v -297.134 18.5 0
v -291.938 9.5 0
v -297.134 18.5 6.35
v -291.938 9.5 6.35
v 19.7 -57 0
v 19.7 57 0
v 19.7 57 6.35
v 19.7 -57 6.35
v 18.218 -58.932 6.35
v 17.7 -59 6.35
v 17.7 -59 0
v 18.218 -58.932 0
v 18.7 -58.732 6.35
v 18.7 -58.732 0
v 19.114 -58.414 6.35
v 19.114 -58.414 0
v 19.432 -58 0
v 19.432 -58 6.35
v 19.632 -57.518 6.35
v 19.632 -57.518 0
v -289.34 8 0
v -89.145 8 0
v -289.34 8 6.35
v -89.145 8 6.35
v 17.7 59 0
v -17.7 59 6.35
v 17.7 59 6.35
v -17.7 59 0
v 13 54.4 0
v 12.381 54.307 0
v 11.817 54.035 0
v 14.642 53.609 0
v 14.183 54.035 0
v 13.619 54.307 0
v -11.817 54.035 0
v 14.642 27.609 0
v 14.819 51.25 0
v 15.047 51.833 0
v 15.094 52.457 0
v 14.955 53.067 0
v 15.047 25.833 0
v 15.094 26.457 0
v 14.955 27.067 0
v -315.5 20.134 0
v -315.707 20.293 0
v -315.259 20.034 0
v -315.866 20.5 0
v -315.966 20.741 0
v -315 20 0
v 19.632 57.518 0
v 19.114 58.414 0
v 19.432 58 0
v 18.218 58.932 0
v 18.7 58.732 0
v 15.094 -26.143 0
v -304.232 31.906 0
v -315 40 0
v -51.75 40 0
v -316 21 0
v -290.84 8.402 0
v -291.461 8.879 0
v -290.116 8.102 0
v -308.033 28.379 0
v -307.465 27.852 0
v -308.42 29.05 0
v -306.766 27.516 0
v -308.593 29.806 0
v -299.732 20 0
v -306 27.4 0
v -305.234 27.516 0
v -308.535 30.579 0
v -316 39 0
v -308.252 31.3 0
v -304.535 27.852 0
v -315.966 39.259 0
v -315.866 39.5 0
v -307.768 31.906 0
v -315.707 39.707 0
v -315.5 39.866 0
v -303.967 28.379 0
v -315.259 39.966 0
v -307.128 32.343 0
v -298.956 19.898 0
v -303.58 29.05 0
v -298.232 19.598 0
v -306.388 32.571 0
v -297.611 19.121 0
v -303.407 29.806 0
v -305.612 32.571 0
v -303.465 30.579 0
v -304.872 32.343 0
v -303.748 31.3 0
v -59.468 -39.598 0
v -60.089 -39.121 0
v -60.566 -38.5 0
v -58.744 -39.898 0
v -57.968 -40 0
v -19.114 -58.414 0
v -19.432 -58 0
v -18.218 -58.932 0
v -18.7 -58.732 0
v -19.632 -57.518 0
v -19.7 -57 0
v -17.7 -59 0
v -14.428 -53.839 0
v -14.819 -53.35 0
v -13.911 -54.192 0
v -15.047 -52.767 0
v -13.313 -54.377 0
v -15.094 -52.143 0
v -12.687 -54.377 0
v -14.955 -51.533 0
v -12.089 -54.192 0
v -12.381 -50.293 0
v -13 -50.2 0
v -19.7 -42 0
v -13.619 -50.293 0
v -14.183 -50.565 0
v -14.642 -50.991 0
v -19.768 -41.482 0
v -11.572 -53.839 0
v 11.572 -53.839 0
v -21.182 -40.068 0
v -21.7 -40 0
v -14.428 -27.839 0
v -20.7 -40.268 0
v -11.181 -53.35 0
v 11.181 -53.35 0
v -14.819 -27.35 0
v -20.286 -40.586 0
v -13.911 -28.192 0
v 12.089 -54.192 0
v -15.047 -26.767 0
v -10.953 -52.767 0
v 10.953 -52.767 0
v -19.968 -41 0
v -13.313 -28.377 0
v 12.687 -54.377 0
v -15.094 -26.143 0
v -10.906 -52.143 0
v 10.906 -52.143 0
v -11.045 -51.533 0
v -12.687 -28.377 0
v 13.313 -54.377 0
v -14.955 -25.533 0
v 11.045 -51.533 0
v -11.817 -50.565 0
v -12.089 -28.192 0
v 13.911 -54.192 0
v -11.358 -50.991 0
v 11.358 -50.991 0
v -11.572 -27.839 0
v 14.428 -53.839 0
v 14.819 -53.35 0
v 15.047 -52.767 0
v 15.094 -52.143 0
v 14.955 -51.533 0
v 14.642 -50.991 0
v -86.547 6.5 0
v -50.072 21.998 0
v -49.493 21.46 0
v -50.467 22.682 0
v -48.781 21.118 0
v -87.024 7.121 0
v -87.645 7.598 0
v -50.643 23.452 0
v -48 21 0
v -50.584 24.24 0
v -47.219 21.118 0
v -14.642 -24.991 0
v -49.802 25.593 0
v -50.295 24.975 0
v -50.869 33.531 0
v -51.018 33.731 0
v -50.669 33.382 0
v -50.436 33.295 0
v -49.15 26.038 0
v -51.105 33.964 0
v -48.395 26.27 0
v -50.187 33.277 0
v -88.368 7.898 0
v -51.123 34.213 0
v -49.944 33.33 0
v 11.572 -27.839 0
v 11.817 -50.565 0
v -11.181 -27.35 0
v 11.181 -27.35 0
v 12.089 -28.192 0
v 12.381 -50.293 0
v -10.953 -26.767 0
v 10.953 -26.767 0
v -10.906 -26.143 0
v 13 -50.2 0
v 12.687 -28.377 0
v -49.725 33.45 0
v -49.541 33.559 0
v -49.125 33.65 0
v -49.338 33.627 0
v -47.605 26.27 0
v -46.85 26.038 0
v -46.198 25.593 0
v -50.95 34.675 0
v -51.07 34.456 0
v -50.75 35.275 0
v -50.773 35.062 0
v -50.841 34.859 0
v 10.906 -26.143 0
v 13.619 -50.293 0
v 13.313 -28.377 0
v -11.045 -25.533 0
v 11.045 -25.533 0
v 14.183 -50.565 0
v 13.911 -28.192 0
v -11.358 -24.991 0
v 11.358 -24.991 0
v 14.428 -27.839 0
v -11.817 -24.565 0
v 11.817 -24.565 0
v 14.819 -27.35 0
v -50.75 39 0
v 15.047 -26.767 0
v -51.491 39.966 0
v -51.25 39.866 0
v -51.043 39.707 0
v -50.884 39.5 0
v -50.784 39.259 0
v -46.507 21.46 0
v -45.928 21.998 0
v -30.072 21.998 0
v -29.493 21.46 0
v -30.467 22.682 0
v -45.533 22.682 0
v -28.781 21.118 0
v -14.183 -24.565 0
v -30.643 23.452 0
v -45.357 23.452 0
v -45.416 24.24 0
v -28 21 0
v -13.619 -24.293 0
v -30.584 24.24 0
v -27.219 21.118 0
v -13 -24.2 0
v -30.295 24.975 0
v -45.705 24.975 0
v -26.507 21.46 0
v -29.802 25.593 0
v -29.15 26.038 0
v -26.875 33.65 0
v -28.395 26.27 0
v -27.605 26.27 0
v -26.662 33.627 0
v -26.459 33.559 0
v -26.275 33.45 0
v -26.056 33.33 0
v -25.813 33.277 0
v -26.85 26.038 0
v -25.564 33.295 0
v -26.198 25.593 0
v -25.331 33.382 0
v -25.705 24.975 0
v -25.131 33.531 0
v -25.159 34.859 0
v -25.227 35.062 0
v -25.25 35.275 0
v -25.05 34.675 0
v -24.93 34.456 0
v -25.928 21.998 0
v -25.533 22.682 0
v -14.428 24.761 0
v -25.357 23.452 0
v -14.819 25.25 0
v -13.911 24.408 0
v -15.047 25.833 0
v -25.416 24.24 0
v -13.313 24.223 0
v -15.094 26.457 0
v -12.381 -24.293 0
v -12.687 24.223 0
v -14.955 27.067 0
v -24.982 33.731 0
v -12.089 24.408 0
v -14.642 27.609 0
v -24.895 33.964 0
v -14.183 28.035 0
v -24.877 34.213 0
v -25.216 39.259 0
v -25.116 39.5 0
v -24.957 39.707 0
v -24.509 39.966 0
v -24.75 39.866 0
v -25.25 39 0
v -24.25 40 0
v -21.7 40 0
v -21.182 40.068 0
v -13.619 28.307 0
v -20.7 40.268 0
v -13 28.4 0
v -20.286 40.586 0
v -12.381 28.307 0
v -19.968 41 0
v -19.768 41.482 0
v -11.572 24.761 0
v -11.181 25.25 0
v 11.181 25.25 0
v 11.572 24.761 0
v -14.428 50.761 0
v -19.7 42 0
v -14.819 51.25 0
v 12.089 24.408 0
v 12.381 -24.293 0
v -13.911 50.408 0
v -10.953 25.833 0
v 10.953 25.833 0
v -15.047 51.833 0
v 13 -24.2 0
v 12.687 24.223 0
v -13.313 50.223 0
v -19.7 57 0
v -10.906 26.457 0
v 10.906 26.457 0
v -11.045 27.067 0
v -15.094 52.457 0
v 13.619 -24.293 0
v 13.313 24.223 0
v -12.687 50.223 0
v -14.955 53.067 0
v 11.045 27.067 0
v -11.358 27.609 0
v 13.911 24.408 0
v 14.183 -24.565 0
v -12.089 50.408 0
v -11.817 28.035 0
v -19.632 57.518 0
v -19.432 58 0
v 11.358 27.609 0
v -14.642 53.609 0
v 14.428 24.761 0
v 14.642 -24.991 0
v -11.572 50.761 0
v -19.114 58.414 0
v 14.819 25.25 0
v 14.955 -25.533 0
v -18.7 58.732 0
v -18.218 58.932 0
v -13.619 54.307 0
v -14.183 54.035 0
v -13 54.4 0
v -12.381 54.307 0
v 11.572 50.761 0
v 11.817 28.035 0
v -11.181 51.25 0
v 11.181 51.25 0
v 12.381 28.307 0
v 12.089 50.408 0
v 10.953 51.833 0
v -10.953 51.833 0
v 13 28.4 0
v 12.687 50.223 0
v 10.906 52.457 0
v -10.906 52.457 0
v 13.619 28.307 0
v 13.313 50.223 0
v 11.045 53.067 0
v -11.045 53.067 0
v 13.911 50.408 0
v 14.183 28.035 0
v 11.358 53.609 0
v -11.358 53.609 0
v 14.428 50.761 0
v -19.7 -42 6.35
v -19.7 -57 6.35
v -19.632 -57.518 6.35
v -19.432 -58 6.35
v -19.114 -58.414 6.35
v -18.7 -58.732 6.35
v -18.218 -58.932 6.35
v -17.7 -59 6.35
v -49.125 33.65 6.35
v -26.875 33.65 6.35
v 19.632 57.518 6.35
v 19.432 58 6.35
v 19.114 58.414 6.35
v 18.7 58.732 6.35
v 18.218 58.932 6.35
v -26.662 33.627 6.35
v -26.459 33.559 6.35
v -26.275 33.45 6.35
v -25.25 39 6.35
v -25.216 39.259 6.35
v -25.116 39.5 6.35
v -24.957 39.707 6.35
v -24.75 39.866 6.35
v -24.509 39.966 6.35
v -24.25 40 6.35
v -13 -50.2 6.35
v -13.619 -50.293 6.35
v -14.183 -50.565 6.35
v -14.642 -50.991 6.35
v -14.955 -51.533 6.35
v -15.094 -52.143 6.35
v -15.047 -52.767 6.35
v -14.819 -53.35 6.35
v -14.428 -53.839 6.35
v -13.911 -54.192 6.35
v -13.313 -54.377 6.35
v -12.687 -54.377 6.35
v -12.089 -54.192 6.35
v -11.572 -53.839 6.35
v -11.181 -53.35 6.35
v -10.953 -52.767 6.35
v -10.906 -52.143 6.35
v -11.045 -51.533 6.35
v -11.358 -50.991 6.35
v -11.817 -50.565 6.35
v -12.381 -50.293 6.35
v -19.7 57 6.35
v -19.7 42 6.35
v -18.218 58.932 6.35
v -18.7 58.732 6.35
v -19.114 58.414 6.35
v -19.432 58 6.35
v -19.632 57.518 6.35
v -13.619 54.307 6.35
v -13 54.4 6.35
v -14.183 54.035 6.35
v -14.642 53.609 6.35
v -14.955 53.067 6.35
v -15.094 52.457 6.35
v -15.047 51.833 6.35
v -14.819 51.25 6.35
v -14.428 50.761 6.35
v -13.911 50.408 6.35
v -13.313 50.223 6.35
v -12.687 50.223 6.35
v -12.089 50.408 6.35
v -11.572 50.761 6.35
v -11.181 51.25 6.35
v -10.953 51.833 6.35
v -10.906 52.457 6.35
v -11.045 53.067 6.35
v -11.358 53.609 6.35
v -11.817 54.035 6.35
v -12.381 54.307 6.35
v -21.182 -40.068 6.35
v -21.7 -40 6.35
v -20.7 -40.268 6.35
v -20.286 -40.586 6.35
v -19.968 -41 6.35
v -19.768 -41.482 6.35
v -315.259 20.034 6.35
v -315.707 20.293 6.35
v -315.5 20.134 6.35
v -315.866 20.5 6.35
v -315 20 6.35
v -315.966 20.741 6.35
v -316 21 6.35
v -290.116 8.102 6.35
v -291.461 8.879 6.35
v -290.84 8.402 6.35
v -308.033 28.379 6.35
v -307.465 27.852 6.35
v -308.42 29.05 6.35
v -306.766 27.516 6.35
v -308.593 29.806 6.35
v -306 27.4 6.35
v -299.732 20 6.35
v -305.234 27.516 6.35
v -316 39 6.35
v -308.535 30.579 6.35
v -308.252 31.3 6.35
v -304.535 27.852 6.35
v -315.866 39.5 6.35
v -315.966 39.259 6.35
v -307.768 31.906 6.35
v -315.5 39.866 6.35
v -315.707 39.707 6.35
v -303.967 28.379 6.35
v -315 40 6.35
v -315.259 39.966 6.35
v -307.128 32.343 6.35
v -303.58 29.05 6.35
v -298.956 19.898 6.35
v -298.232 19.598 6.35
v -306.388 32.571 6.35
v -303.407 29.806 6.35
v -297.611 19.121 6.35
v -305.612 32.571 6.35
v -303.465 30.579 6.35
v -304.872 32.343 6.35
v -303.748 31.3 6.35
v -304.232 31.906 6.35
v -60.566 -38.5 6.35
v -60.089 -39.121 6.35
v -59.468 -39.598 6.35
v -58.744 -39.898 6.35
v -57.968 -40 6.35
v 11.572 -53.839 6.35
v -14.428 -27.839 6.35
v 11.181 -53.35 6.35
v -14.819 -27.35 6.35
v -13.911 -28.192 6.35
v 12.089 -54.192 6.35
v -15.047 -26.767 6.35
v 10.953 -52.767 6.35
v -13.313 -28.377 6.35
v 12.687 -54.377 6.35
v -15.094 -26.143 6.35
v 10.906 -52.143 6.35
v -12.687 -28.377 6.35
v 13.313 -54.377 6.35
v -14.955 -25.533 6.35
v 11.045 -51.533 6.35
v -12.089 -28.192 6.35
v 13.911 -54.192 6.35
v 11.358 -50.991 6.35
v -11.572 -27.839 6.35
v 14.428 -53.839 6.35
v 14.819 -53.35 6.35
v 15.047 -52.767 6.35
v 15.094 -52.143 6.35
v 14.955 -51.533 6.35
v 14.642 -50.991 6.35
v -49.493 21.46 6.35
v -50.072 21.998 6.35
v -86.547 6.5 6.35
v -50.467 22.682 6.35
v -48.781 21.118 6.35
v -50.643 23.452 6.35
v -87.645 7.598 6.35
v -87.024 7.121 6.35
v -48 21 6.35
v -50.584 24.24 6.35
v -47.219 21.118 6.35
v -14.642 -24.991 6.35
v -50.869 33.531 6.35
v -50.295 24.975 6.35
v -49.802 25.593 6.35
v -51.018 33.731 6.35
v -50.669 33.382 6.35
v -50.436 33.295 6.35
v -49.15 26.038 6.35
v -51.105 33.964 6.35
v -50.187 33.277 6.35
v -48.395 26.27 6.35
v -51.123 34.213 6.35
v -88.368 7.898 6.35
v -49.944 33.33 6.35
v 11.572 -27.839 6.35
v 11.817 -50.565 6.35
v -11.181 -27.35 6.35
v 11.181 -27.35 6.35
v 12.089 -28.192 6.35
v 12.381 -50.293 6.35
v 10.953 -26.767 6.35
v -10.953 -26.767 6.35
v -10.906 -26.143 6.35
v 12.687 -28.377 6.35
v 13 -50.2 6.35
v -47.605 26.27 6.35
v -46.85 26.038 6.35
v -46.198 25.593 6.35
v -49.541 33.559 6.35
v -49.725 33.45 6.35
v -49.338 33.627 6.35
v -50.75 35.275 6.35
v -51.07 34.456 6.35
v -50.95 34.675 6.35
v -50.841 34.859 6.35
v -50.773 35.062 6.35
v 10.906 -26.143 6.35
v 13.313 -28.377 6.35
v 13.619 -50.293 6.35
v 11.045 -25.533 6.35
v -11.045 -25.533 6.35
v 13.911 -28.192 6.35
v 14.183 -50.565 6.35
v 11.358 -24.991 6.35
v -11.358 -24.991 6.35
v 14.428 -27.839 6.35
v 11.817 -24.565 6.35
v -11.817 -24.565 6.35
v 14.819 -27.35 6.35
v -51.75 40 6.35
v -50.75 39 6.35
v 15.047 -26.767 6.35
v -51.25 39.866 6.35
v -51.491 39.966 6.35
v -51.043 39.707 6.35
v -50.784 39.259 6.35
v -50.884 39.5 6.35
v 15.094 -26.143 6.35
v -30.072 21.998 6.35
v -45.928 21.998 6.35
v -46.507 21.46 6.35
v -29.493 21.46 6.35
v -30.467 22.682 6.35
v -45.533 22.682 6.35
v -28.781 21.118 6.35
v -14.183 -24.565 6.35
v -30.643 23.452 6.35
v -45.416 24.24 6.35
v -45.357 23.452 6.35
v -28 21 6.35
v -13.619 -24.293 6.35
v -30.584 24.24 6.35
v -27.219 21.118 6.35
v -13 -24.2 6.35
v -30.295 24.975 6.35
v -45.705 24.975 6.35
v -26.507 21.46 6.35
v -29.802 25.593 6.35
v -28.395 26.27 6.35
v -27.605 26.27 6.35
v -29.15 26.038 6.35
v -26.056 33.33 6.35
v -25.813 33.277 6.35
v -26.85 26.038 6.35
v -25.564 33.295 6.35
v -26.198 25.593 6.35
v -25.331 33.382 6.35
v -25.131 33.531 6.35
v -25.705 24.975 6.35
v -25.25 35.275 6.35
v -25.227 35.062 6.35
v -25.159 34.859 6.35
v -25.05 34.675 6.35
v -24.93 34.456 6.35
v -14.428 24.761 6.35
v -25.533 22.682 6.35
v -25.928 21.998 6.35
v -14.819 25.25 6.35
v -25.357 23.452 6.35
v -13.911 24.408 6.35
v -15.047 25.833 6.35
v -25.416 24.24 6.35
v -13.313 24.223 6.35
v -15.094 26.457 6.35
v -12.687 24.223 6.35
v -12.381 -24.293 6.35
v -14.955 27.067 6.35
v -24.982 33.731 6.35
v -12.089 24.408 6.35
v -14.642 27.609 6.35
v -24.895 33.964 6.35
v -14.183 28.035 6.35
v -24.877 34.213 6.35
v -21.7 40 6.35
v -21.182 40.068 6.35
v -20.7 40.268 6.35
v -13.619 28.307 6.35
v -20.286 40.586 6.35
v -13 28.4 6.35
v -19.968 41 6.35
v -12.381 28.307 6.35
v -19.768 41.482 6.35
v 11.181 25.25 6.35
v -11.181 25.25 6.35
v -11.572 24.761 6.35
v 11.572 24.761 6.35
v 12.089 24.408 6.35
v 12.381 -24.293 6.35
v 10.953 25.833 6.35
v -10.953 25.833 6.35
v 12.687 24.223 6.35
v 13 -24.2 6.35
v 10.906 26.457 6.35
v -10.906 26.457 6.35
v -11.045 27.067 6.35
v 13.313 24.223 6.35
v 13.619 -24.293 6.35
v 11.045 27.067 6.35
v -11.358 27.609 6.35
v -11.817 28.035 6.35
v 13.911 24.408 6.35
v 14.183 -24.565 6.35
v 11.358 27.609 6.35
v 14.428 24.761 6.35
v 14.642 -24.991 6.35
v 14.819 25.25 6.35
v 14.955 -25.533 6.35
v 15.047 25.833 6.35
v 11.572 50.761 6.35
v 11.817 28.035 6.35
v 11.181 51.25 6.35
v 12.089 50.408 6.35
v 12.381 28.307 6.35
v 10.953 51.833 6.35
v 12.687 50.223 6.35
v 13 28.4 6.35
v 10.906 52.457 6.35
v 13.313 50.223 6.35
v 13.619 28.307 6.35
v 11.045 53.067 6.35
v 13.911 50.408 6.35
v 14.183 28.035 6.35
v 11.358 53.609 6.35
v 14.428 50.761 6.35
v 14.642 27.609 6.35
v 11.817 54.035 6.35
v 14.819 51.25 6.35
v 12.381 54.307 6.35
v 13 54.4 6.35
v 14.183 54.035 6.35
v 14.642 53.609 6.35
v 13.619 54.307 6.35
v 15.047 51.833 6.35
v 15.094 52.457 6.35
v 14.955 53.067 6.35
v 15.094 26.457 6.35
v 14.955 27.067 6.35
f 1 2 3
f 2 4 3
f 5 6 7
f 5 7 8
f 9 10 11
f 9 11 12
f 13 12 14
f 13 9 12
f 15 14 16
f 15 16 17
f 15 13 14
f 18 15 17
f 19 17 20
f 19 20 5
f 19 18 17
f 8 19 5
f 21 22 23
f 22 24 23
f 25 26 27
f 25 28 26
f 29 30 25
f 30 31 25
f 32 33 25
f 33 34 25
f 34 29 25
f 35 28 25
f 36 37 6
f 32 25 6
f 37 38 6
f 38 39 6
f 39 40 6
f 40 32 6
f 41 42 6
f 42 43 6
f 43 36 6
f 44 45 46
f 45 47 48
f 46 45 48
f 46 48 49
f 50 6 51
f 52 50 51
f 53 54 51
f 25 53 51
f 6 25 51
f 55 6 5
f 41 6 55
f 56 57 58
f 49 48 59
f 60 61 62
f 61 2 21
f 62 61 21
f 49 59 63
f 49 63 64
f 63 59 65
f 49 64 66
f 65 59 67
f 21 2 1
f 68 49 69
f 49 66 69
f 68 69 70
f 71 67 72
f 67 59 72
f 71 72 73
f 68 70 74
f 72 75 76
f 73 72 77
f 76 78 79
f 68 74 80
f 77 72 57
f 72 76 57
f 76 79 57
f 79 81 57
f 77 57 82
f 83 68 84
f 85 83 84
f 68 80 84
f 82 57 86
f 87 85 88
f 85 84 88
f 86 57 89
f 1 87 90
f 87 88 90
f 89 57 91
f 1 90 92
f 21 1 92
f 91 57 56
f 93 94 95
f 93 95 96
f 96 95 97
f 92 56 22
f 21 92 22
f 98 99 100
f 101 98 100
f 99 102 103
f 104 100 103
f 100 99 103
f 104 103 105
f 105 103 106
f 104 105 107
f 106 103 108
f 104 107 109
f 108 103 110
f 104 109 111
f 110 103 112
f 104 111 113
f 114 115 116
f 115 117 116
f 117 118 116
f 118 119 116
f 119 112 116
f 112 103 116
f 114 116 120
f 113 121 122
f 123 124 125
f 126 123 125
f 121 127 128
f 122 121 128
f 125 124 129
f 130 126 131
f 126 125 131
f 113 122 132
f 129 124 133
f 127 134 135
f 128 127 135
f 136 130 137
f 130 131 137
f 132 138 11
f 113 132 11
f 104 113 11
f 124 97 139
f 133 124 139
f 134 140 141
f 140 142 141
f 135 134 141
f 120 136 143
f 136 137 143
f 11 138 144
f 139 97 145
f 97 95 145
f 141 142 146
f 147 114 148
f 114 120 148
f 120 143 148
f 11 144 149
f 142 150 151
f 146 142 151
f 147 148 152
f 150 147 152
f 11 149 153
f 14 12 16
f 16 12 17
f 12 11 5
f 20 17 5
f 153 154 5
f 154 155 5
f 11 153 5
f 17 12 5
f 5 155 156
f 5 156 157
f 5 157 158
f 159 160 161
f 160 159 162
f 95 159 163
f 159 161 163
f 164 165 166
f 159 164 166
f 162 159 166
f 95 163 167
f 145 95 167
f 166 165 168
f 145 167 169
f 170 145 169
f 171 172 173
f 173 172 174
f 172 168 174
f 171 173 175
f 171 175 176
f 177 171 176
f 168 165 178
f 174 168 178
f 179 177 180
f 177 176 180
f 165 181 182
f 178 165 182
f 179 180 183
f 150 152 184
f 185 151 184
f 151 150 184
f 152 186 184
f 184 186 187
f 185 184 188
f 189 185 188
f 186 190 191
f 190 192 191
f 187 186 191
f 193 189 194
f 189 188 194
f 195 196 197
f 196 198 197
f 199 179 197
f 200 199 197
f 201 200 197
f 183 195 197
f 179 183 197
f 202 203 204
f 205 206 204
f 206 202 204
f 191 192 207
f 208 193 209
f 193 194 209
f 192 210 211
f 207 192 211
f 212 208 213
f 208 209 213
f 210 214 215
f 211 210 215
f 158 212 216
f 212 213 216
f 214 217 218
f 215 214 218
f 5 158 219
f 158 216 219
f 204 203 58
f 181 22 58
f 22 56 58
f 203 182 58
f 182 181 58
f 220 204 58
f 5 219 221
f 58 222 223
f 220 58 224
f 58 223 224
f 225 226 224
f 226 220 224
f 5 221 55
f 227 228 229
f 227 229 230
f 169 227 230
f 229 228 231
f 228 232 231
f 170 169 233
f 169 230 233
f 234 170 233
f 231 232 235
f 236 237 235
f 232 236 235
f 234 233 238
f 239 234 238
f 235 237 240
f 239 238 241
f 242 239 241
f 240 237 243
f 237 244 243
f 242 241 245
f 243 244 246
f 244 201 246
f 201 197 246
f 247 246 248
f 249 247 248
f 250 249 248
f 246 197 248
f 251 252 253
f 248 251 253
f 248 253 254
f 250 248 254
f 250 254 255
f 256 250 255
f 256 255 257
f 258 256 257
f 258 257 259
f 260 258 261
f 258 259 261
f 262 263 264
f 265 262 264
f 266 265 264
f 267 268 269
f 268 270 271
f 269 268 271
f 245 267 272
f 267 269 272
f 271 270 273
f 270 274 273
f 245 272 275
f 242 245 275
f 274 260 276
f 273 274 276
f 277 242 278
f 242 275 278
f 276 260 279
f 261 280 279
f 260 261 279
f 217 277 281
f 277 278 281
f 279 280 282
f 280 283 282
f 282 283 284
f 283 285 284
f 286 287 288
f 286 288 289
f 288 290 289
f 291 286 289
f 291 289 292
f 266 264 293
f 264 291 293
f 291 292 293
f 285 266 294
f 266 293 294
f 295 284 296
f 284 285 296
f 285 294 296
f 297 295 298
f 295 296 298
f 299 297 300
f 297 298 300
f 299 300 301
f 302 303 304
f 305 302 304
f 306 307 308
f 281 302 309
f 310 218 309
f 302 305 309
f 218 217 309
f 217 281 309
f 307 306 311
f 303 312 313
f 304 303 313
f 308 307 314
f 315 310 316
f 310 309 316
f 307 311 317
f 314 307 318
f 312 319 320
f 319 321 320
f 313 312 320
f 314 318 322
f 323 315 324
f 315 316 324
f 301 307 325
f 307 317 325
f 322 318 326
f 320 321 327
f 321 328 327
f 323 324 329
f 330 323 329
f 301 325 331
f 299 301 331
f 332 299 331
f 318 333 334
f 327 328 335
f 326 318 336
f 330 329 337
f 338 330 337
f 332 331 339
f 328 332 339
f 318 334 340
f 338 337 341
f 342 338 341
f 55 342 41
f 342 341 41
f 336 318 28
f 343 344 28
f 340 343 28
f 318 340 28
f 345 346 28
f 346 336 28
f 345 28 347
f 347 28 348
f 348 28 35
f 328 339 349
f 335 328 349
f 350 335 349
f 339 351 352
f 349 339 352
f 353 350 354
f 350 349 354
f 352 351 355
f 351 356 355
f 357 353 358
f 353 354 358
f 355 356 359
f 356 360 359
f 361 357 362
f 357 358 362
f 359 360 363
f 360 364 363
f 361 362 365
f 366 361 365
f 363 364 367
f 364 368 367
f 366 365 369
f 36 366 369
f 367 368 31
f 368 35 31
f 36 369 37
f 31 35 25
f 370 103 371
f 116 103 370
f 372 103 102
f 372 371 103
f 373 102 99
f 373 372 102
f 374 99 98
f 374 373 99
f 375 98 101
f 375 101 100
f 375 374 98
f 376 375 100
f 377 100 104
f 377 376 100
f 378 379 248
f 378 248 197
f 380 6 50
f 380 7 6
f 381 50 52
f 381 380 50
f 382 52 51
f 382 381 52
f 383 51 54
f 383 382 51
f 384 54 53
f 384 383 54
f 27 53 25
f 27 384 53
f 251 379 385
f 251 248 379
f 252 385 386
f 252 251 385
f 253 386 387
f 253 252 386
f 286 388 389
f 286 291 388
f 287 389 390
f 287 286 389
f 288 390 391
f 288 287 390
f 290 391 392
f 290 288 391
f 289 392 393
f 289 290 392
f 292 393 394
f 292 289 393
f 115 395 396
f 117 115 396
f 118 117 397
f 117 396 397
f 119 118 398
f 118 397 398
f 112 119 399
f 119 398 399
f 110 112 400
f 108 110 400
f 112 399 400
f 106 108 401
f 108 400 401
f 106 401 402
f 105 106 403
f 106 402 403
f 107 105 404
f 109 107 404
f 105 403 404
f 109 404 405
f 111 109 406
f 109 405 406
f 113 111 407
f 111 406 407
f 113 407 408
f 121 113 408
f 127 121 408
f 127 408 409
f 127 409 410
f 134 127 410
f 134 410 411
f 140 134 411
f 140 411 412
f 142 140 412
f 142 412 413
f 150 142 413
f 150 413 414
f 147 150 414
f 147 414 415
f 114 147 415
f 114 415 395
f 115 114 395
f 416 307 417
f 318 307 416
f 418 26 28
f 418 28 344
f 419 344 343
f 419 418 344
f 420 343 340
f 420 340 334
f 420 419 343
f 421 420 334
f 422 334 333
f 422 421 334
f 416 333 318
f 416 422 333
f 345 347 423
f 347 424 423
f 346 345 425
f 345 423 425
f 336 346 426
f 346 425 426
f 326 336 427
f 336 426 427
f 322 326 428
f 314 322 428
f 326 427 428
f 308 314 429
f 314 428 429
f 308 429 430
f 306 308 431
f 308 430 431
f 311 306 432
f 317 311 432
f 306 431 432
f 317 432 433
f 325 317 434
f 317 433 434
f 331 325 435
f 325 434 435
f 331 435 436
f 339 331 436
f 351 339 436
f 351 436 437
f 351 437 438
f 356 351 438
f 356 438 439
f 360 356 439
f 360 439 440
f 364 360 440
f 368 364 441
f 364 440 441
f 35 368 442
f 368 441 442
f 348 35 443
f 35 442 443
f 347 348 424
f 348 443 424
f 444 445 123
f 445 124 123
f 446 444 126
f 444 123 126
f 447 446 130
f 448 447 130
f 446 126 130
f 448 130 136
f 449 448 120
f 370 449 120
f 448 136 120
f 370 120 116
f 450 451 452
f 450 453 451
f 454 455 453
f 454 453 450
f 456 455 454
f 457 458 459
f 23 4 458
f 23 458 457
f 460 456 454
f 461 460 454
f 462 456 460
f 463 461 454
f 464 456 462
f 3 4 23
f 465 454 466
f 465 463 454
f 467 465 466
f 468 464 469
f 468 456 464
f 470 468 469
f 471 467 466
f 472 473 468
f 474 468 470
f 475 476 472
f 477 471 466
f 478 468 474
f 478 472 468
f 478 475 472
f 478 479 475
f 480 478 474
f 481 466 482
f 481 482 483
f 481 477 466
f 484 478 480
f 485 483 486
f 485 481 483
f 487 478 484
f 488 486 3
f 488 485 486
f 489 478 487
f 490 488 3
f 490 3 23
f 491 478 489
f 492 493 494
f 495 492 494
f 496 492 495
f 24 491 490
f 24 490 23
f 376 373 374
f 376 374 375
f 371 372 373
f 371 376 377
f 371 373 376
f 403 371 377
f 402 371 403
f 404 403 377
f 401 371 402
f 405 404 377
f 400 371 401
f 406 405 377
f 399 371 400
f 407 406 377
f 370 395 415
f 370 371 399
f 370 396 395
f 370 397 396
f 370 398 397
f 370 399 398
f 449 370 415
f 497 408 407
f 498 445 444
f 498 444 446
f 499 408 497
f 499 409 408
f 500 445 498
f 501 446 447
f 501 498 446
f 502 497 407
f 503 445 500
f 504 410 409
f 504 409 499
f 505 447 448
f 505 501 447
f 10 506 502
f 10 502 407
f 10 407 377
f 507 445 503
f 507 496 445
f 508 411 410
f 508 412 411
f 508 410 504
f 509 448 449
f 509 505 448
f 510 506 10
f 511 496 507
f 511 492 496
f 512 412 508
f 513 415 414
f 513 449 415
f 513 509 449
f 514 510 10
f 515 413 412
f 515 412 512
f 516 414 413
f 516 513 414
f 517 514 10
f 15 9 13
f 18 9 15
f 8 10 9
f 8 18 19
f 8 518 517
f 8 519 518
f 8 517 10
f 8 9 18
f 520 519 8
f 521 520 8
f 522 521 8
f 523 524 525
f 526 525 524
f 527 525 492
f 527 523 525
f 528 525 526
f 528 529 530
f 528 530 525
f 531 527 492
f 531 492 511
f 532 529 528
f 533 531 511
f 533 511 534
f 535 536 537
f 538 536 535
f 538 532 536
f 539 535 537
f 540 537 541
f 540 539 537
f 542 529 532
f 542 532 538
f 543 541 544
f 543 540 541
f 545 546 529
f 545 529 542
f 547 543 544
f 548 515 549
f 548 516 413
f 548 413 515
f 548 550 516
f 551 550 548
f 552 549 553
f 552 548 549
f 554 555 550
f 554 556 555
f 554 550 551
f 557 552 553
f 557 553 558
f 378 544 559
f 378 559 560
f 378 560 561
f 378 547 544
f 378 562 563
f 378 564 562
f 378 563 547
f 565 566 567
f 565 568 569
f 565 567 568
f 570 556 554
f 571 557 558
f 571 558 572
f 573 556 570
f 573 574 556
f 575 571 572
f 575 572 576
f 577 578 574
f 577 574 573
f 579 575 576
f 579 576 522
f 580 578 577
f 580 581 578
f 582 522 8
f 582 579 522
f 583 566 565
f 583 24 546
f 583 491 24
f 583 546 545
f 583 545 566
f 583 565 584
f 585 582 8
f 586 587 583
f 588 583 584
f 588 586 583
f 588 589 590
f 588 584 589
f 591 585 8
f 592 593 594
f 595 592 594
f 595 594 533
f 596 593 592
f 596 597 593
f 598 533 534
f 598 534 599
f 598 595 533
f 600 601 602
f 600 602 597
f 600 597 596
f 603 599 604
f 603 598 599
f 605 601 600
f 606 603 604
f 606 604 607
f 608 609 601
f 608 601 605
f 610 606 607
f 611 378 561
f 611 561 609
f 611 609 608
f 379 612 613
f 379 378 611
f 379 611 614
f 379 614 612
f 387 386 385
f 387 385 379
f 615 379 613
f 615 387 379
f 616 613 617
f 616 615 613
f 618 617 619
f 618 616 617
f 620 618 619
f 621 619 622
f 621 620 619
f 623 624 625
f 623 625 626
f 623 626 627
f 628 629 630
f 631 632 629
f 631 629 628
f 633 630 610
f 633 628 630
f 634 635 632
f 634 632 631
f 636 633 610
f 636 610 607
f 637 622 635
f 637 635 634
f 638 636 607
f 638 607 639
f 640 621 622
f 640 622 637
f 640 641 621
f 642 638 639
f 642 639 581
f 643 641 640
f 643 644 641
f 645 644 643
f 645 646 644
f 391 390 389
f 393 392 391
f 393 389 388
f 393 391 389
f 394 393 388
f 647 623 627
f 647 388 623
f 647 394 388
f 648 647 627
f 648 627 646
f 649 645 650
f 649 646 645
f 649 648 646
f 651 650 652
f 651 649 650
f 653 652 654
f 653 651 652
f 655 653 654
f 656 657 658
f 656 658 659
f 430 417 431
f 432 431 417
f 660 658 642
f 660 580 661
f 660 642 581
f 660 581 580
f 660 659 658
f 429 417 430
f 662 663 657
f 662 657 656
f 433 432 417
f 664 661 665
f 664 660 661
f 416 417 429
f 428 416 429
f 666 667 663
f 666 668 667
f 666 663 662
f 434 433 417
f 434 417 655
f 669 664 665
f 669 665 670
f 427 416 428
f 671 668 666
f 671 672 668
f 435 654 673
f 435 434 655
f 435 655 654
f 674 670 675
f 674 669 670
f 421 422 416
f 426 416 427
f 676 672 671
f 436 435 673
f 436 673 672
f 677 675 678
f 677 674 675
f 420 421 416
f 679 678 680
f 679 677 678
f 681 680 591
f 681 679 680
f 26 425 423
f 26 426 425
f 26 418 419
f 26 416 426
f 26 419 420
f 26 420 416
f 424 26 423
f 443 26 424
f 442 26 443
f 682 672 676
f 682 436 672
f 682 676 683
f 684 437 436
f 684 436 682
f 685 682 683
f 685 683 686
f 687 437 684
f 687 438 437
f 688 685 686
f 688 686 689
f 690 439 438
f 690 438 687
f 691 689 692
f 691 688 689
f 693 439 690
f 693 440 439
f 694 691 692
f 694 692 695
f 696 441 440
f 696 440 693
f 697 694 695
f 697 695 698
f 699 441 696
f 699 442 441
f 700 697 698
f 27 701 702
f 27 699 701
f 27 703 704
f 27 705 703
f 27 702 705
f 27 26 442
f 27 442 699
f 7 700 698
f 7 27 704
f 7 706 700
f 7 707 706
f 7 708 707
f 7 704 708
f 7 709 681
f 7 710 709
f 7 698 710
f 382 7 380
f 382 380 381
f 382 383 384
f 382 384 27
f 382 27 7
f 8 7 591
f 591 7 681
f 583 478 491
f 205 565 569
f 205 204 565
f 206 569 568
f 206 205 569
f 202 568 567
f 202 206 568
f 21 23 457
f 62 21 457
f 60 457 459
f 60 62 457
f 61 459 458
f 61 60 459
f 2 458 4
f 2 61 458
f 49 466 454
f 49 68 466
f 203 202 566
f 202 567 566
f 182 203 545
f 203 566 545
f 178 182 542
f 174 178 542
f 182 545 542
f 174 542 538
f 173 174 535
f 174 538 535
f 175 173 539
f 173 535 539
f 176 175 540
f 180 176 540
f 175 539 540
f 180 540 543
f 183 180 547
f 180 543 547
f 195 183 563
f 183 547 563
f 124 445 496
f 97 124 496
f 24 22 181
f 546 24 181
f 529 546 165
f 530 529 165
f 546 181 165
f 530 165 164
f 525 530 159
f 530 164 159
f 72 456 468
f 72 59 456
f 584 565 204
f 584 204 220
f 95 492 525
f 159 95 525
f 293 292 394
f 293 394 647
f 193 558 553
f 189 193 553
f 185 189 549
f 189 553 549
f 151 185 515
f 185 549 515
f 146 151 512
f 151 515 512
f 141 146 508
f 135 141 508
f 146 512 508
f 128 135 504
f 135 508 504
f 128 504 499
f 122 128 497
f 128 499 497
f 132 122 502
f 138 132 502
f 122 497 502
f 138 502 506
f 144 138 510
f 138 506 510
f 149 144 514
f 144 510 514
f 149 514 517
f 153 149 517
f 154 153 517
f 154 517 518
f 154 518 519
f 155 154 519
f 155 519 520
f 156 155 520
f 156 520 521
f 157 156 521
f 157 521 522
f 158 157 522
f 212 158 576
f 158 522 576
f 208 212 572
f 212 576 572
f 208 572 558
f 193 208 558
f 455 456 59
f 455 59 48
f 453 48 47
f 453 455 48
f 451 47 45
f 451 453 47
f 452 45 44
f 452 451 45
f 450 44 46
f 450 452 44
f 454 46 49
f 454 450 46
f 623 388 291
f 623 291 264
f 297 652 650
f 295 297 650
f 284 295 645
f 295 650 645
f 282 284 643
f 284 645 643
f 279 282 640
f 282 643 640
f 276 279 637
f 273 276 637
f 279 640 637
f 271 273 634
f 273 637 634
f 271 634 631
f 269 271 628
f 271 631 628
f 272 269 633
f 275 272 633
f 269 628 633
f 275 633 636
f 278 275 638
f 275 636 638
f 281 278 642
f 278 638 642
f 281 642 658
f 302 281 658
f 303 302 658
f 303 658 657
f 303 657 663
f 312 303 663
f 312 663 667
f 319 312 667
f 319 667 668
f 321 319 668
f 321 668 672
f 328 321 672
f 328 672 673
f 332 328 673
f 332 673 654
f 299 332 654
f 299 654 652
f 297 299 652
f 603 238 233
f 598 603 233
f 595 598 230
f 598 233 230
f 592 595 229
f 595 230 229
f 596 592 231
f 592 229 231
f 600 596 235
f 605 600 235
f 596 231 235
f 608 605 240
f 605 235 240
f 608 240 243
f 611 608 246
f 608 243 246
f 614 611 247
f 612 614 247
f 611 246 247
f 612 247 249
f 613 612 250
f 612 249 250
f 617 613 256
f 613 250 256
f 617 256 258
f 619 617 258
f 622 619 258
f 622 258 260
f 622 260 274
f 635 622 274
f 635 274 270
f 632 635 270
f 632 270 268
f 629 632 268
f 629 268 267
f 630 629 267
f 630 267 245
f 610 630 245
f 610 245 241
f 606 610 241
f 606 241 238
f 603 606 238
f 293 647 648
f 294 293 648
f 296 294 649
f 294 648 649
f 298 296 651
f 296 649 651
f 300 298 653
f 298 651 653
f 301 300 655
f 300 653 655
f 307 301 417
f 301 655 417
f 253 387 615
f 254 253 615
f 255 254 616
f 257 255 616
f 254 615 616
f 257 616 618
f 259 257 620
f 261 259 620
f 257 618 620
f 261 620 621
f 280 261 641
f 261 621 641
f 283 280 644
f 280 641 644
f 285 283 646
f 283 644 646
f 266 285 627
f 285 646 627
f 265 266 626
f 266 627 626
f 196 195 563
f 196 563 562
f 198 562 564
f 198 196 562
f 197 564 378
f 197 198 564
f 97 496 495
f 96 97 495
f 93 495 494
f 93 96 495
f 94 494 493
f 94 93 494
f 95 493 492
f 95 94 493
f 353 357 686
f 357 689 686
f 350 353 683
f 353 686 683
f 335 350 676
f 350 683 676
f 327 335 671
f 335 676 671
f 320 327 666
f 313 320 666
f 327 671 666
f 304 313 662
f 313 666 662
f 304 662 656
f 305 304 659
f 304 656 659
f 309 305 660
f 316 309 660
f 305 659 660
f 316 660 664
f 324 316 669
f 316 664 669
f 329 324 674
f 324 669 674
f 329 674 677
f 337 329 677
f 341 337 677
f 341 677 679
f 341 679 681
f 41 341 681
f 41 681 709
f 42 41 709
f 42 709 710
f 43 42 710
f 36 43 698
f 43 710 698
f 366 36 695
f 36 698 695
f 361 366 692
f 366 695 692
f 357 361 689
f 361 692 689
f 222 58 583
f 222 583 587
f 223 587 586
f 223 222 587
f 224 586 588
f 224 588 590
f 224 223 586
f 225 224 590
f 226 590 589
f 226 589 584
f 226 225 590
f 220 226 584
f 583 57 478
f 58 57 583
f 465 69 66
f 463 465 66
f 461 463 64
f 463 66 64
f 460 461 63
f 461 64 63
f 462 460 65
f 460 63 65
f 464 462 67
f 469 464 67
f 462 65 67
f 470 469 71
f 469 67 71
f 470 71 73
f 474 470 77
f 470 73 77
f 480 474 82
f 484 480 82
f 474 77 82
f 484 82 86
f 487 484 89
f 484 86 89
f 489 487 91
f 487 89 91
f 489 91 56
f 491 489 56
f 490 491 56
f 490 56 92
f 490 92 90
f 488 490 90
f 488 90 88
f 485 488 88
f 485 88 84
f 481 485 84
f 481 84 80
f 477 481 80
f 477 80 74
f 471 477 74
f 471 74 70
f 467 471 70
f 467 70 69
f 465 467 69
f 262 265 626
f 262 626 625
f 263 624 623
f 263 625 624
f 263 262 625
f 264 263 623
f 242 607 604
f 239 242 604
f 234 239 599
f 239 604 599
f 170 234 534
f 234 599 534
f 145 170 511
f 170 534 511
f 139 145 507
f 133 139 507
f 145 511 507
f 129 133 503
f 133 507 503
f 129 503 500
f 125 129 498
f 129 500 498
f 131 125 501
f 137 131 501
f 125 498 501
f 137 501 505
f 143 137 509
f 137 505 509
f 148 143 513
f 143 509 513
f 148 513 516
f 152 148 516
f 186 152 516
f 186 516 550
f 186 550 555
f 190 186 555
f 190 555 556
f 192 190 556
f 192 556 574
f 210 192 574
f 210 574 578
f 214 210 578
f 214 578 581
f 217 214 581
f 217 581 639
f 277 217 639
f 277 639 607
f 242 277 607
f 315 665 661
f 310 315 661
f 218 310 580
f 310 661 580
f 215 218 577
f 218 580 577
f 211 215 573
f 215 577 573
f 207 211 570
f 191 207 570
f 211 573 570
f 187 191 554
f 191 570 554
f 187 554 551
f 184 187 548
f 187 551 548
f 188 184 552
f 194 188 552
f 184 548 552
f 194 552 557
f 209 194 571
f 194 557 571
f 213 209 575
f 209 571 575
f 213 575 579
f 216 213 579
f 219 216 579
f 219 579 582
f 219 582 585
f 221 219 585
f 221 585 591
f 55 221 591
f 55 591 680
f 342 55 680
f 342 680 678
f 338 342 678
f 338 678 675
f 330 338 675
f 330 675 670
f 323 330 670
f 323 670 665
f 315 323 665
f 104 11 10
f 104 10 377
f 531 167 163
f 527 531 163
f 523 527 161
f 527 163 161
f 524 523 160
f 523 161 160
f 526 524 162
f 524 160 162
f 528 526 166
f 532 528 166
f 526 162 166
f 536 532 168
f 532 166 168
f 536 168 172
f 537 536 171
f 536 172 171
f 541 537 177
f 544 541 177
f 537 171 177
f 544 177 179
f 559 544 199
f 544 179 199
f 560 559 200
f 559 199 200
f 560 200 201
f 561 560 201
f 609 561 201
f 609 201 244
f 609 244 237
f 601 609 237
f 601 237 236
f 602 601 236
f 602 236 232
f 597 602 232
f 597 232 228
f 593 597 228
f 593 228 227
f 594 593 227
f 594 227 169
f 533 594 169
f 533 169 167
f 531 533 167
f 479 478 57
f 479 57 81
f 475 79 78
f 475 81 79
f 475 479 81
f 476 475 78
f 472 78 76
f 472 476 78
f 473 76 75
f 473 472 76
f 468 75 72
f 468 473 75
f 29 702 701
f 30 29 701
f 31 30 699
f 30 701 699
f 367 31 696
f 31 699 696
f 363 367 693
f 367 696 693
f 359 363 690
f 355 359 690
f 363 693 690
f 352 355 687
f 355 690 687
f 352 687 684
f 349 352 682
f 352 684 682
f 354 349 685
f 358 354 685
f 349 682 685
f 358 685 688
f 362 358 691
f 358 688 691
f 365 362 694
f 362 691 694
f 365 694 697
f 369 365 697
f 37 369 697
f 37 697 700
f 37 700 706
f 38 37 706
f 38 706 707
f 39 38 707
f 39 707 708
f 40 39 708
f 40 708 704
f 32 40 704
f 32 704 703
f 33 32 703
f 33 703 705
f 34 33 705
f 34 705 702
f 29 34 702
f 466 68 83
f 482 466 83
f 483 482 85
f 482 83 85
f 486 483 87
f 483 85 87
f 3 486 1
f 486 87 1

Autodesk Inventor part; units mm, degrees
ref_plane "YZ Plane" through (0, 0, 0) normal (1, 0, 0) x (0, 1, 0)
ref_plane "XZ Plane" through (0, 0, 0) normal (0, 1, 0) x (-1, 0, 0)
sketch "Sketch1" plane through (0, 0, 0) normal (0, 0, 1) x (1, 0, 0)
  line L0 (19.7, -70) -> (-19.7, -70)
  line L1 (-19.7, -70) -> (-19.7, 70)
  line L2 (-19.7, 70) -> (19.7, 70)
  line L3 (19.7, 70) -> (19.7, -70)
  line L4 (19.7, -70) -> (-19.7, 70) construction
  line L5 (-19.7, -70) -> (19.7, 70) construction
  line L6 (19.7, 8.6) -> (-19.7, 8.6) construction
  line L7 (-19.7, 8.6) -> (-19.7, 70) construction
  line L8 (-19.7, 70) -> (19.7, 70) construction
  line L9 (19.7, 70) -> (19.7, 8.6) construction
  line L10 (19.7, 8.6) -> (-19.7, 70) construction
  line L11 (-19.7, 8.6) -> (19.7, 70) construction
  line L12 (19.7, -70) -> (-19.7, -70) construction
  line L13 (-19.7, -70) -> (-19.7, -8.6) construction
  line L14 (-19.7, -8.6) -> (19.7, -8.6) construction
  line L15 (19.7, -8.6) -> (19.7, -70) construction
  line L16 (19.7, -70) -> (-19.7, -8.6) construction
  line L17 (-19.7, -70) -> (19.7, -8.6) construction
  line L18 (19.7, 19.6) -> (-19.7, 19.6) construction
  line L19 (-19.7, 19.6) -> (-19.7, 59) construction
  line L20 (-19.7, 59) -> (19.7, 59)
  line L21 (19.7, 59) -> (19.7, 19.6) construction
  line L22 (19.7, 19.6) -> (-19.7, 59) construction
  line L23 (-19.7, 19.6) -> (19.7, 59) construction
  line L24 (19.7, -59) -> (-19.7, -59)
  line L25 (-19.7, -59) -> (-19.7, -19.6) construction
  line L26 (-19.7, -19.6) -> (19.7, -19.6) construction
  line L27 (19.7, -19.6) -> (19.7, -59) construction
  line L28 (19.7, -59) -> (-19.7, -19.6) construction
  line L29 (-19.7, -59) -> (19.7, -19.6) construction
  line L30 (13, 26.3) -> (-13, 26.3) construction
  line L31 (-13, 26.3) -> (-13, 52.3) construction
  line L32 (-13, 52.3) -> (13, 52.3) construction
  line L33 (13, 52.3) -> (13, 26.3) construction
  line L34 (13, 26.3) -> (-13, 52.3) construction
  line L35 (-13, 26.3) -> (13, 52.3) construction
  line L36 (13, -52.3) -> (-13, -52.3) construction
  line L37 (-13, -52.3) -> (-13, -26.3) construction
  line L38 (-13, -26.3) -> (13, -26.3) construction
  line L39 (13, -26.3) -> (13, -52.3) construction
  line L40 (13, -52.3) -> (-13, -26.3) construction
  line L41 (-13, -52.3) -> (13, -26.3) construction
  line L42 (-316, 40) -> (-19.7, 40)
  line L43 (-19.7, 40) -> (-19.7, 20)
  line L44 (-19.7, 20) -> (-316, 20)
  line L45 (-316, 20) -> (-316, 40)
  line L46 (19.7, -66) -> (19.7, -66)
  line L47 (19.772, 73.498) -> (19.772, 73.498)
  point P0 (0, 0)
  point P1 (0, 39.3)
  point P2 (0, -39.3)
  point P3 (-316, 30)
  point P4 (-291, 20)
  point P5 (17, 72.5)
  point P6 (17, -72.5)
  point P7 (-19.7, 40)
  point P8 (-19.7, 20)
  point P9 (-19.7, -59)
  point P10 (19.7, 59)
  point P11 (-19.7, 59)
  dimension "d1" = 140
  dimension "d2" = 61.4
  dimension "d3" = 39.4
  dimension "d4" = 26
  dimension "d5" = 26
  dimension "d6" = 20
  dimension "d8" = 316
  dimension "d11" = 25
  dimension "d55" = 30
  dimension "d126" = 6.7
  dimension "d128" = 6.7
extrude "Extrusion1" add sketch "Sketch1" along normal blind 6.35 contours L24 L1 L20 L3 | L44 L45 L42 L1
sketch "Sketch2" plane through (0, 0, 6.35) normal (0, 0, 1) x (1, 0, 0)
  line L0 (19.7, -59) -> (19.7, 59) projected
  line L1 (-19.7, 59) -> (-19.7, 40) projected
  line L2 (-19.7, 40) -> (-316, 40) projected
  line L3 (-316, 40) -> (-316, 20) projected
  line L4 (-316, 20) -> (-19.7, 20) projected
  line L5 (-19.7, 20) -> (-19.7, -59) projected
  line L6 (19.7, -59) -> (-19.7, -59) construction
  line L7 (-19.7, -59) -> (19.7, -59) projected
  line L8 (19.7, 59) -> (-19.7, 59) projected
  line L9 (-19.7, -40) -> (-59.7, -40)
  line L10 (-59.7, -40) -> (-87.4128, 8)
  line L11 (-87.4128, 8) -> (-291.0718, 8)
  line L12 (-291.0718, 8) -> (-298, 20)
  point P0 (0, 0)
  point P1 (0, 39.3)
  point P2 (0, -39.3)
  point P3 (13, 26.3)
  point P4 (13, -26.3)
  dimension "d25" = 18
  dimension "d78" = 40
  dimension "d124" = 19
  dimension "d125" = 19
  dimension "d139" = 120
  dimension "d140" = 12
extrude "Extrusion2" add sketch "Sketch2" against normal up to surface (6.35 mm away) contours L9 L10 L11 L12 L4 L5
hole "Hole1" at (-13, 52.3, 0) at (13, 52.3, 0) at (13, 26.3, 0) at (-13, 26.3, 0) at (-13, -26.3, 0) at (13, -26.3, 0) at (13, -52.3, 0) at (-13, -52.3, 0) direction (0, 0, 1) diameter 4.2 end through all
sketch "Z POSITIONING" plane through (0, 0, 6.35) normal (0, 0, 1) x (1, 0, 0)
  circle A0 centre (-13, -52.3) radius 2.1 projected
  circle A1 centre (13, -52.3) radius 2.1 projected
  circle A2 centre (13, -26.3) radius 2.1 projected
  circle A3 centre (-13, -26.3) radius 2.1 projected
  circle A4 centre (-13, 26.3) radius 2.1 projected
  circle A5 centre (13, 26.3) radius 2.1 projected
  circle A6 centre (13, 52.3) radius 2.1 projected
  circle A7 centre (-13, 52.3) radius 2.1 projected
  line L0 (-19.7, 40) -> (-316, 40) projected
  line L1 (-316, 40) -> (-316, 20) projected
  line L2 (-316, 20) -> (-298, 20) projected
  line L3 (-73.0306, 76.9979) -> (-73.0306, 70.6479)
  line L4 (-13, 52.3) -> (13, 52.3) construction
  line L5 (-51.9212, 48) -> (-16.9212, 48) construction
  line L6 (-16.9212, 48) -> (-16.9212, 40) construction
  line L7 (-16.9212, 40) -> (-51.9212, 40) construction
  line L8 (-51.9212, 40) -> (-51.9212, 48) construction
  line L9 (-51.9212, 82.15) -> (-6.1684, 82.15) construction
  line L10 (-125.0107, 88.5) -> (3.0638, 88.5) construction
  line L11 (3.0638, 88.5) -> (3.0638, 82.15) construction
  line L12 (3.0638, 82.15) -> (-125.0107, 82.15) construction
  line L13 (-125.0107, 82.15) -> (-125.0107, 88.5) construction
  line L14 (-120.28, 101.5) -> (-45.2895, 101.5) construction
  line L15 (-45.2895, 101.5) -> (-45.2895, 88.5) construction
  line L16 (-45.2895, 88.5) -> (-120.28, 88.5) construction
  line L17 (-120.28, 88.5) -> (-120.28, 101.5) construction
  line L18 (-46.2871, 43.2481) -> (-33.7765, 43.2481) construction
  line L19 (-33.7765, 43.2481) -> (-33.7765, 40) construction
  line L20 (-33.7765, 40) -> (-46.2871, 40) construction
  line L21 (-46.2871, 40) -> (-46.2871, 43.2481) construction
  line L22 (-83.6356, 76.3105) -> (-20.2105, 76.3105) construction
  line L23 (-20.2105, 76.3105) -> (-20.2105, 72.407) construction
  line L24 (-20.2105, 72.407) -> (-83.6356, 72.407) construction
  line L25 (-83.6356, 72.407) -> (-83.6356, 76.3105) construction
  line L26 (-72.5883, 86.1984) -> (-50.3384, 86.1984) construction
  line L27 (-50.3384, 86.1984) -> (-50.3384, 82.15) construction
  line L28 (-50.3384, 82.15) -> (-72.5883, 82.15) construction
  line L29 (-72.5883, 82.15) -> (-72.5883, 86.1984) construction
  line L30 (-111.3546, 92.5484) -> (-73.1953, 92.5484) construction
  line L31 (-73.1953, 92.5484) -> (-73.1953, 88.5) construction
  line L32 (-73.1953, 88.5) -> (-111.3546, 88.5) construction
  line L33 (-111.3546, 88.5) -> (-111.3546, 92.5484) construction
  line L34 (-122.3616, 107.85) -> (-60.8324, 107.85) construction
  line L35 (-60.8324, 107.85) -> (-60.8324, 101.5) construction
  line L36 (-60.8324, 101.5) -> (-122.3616, 101.5) construction
  line L37 (-122.3616, 101.5) -> (-122.3616, 107.85) construction
  line L38 (-97.4496, 120.85) -> (-64.4997, 120.85) construction
  line L39 (-64.4997, 120.85) -> (-64.4997, 107.85) construction
  line L40 (-64.4997, 107.85) -> (-97.4496, 107.85) construction
  line L41 (-97.4496, 107.85) -> (-97.4496, 120.85) construction
  line L42 (-105.6043, 105.5261) -> (-84.5103, 105.5261) construction
  line L43 (-84.5103, 105.5261) -> (-84.5103, 101.5) construction
  line L44 (-84.5103, 101.5) -> (-105.6043, 101.5) construction
  line L45 (-105.6043, 101.5) -> (-105.6043, 105.5261) construction
  line L46 (-109.4941, 111.8984) -> (-71.3471, 111.8984) construction
  line L47 (-71.3471, 111.8984) -> (-71.3471, 107.85) construction
  line L48 (-71.3471, 107.85) -> (-109.4941, 107.85) construction
  line L49 (-109.4941, 107.85) -> (-109.4941, 111.8984) construction
  line L50 (-134.6087, 124.025) -> (-34.6087, 124.025) construction
  line L51 (-34.6087, 124.025) -> (-34.6087, 120.85) construction
  line L52 (-34.6087, 120.85) -> (-134.6087, 120.85) construction
  line L53 (-134.6087, 120.85) -> (-134.6087, 124.025) construction
  line L54 (-97.1464, 128.0511) -> (-69.166, 128.0511) construction
  line L55 (-69.166, 128.0511) -> (-69.166, 124.025) construction
  line L56 (-69.166, 124.025) -> (-97.1464, 124.025) construction
  line L57 (-97.1464, 124.025) -> (-97.1464, 128.0511) construction
  line L58 (-143.7669, 74.15) -> (-108.5896, 74.15) construction
  line L59 (-148.1315, 74.15) -> (-115.878, 74.15) construction
  line L60 (-115.878, 74.15) -> (-115.878, 70.9884) construction
  line L61 (-115.878, 70.9884) -> (-148.1315, 70.9884) construction
  line L62 (-148.1315, 70.9884) -> (-148.1315, 74.15) construction
  line L63 (-59.7, -40) -> (-19.7, -40) projected
  line L64 (-19.7, -40) -> (-19.7, -59) projected
  line L65 (-19.7, -59) -> (19.7, -59) projected
  line L66 (19.7, -59) -> (19.7, 59) projected
  line L67 (19.7, 59) -> (-19.7, 59) projected
  line L68 (-19.7, 59) -> (-19.7, 40) projected
  line L69 (-298, 20) -> (-291.0718, 8) projected
  line L70 (-291.0718, 8) -> (-87.4128, 8) projected
  line L71 (-87.4128, 8) -> (-59.7, -40) projected
  point P0 (0, 0)
  point P1 (0, 52.3)
  dimension "d39" = 6.35
  dimension "d42" = 35
  dimension "d43" = 8
  dimension "d44" = 34.15
  dimension "d45" = 6.35
  dimension "d46" = 13
  dimension "d48" = 6.35
  dimension "d49" = 13
  dimension "d50" = 100
  dimension "d51" = 3.175
  dimension "d52" = 46.7
  dimension "d53" = 34.15
ref_plane "PRINTBED PLANE" through (-316, 74.15, 6.35) normal (0, 1, 0) x (1, 0, 0)
sketch "Y POSITIONING" plane through (0, 0, 6.35) normal (0, 0, 1) x (1, 0, 0)
  line L0 (-315, 74.15) -> (-29, 74.15) construction
  line L1 (-306, 74.15) -> (-306, 54.4706) construction
  line L2 (-38, 74.15) -> (-38, 59.15) construction
  line L3 (-316, 40) -> (-316, 20) projected
  line L4 (-32, 40) -> (-44, 40) construction
  line L5 (-44, 40) -> (-44, 74.15) construction
  line L6 (-44, 74.15) -> (-32, 74.15) construction
  line L7 (-32, 74.15) -> (-32, 40) construction
  line L8 (-32, 40) -> (-44, 74.15) construction
  line L9 (-44, 40) -> (-32, 74.15) construction
  line L10 (-19.7, 40) -> (-316, 40) projected
  circle A0 centre (-13, -52.3) radius 2.1 projected
  circle A1 centre (13, -52.3) radius 2.1 projected
  circle A2 centre (13, -26.3) radius 2.1 projected
  circle A3 centre (-13, -26.3) radius 2.1 projected
  circle A4 centre (-13, 26.3) radius 2.1 projected
  circle A5 centre (13, 26.3) radius 2.1 projected
  circle A6 centre (13, 52.3) radius 2.1 projected
  circle A7 centre (-13, 52.3) radius 2.1 projected
  line L11 (-19.7, 40) -> (-316, 40) projected
  line L12 (-316, 40) -> (-316, 20) projected
  line L13 (-316, 20) -> (-298, 20) projected
  line L14 (-13, 52.3) -> (13, 26.3) construction
  line L15 (-383.14, 74.15) -> (86.84, 74.15) construction
  line L16 (-53, 40) -> (-23, 40) construction
  line L17 (-23, 40) -> (-23, 48) construction
  line L18 (-23, 48) -> (-53, 48) construction
  line L19 (-53, 48) -> (-53, 40) construction
  line L20 (-53, 40) -> (-23, 48) construction
  line L21 (-23, 40) -> (-53, 48) construction
  line L22 (-59.7, -40) -> (-19.7, -40) projected
  line L23 (-58, 33.65) -> (-18, 33.65) construction
  line L24 (-18, 33.65) -> (-18, 13.65) construction
  line L25 (-18, 13.65) -> (-58, 13.65) construction
  line L26 (-58, 13.65) -> (-58, 33.65) construction
  line L27 (-48, 23.65) -> (-28, 23.65) construction
  line L28 (-19.7, -40) -> (-19.7, -59) projected
  line L29 (-19.7, -59) -> (19.7, -59) projected
  line L30 (19.7, -59) -> (19.7, 59) projected
  line L31 (19.7, 59) -> (-19.7, 59) projected
  line L32 (-19.7, 59) -> (-19.7, 40) projected
  line L33 (-298, 20) -> (-291.0718, 8) projected
  line L34 (-291.0718, 8) -> (-87.4128, 8) projected
  line L35 (-87.4128, 8) -> (-59.7, -40) projected
  point P0 (0, 0)
  point P1 (-38, 57.075)
  point P2 (-32, 47.5)
  point P3 (0, 39.3)
  point P4 (-38, 44)
  point P5 (-38, 40)
  point P6 (-38, 33.65)
  point P7 (-38, 23.65)
  point P8 (-18, 23.65)
  dimension "d58" = 286
  dimension "d60" = 9
  dimension "d61" = 10
  dimension "d62" = 12
  dimension "d63" = 38
  dimension "d64" = 9
  dimension "d65" = 30
  dimension "d66" = 8
  dimension "d67" = 15
  dimension "d68" = 19.15
  dimension "d83" = 40
  dimension "d84" = 20
  dimension "d85" = 6.35
  dimension "d90" = 20
sketch "Sketch5" plane through (0, 0, 6.35) normal (0, 0, 1) x (1, 0, 0)
  line L0 (-296, 20) -> (-316, 20) construction
  line L1 (-316, 20) -> (-316, 40) construction
  line L2 (-316, 40) -> (-296, 40) construction
  line L3 (-296, 40) -> (-296, 20) construction
  line L4 (-296, 20) -> (-316, 40) construction
  line L5 (-316, 20) -> (-296, 40) construction
  point P0 (0, 0)
  point P1 (-306, 30)
  point P2 (-306, 30)
hole "Hole2" at (-306, 30, 6.35) direction (0, 0, -1) diameter 5.2 end through all
sketch "Sketch6" plane through (0, 0, 6.35) normal (0, 0, 1) x (1, 0, 0)
  line L0 (-50.75, 40) -> (-25.25, 40)
  line L1 (-25.25, 40) -> (-25.25, 33.65)
  line L2 (-25.25, 33.65) -> (-50.75, 33.65)
  line L3 (-50.75, 33.65) -> (-50.75, 40)
  line L4 (-38, 74.15) -> (-38, 59.15) construction
  line L5 (-19.7, 40) -> (-316, 40) projected
  line L6 (-58, 33.65) -> (-18, 33.65) construction
  circle A0 centre (-50.25, 34.15) radius 0.875
  circle A1 centre (-25.75, 34.15) radius 0.875
  point P0 (0, 0)
  point P1 (-38, 40)
  point P2 (-32, 47.5)
  point P3 (-26.4681, 33.65)
  point P4 (-25.25, 34.8681)
  point P5 (-50.75, 34.8681)
  point P6 (-49.5319, 33.65)
  dimension "d79" = 25.5
  dimension "d86" = 1.75
  dimension "d87" = 0.5
  dimension "d88" = 0.5
  dimension "d89" = 0.5
extrude "Extrusion3" cut sketch "Sketch6" against normal through all
hole "Hole3" at (-48, 23.65, 6.35) at (-28, 23.65, 6.35) direction (0, 0, -1) diameter 5.3 end through all
sketch "Sketch9" plane through (0, 0, 6.35) normal (0, 0, 1) x (1, 0, 0)
  circle A0 centre (-28, 23.65) radius 2.65 projected
  circle A1 centre (-48, 23.65) radius 2.65 projected
  line L0 (-50.75, 34.8681) -> (-50.75, 40) projected
  line L1 (-50.75, 40) -> (-316, 40) projected
  line L2 (-316, 40) -> (-316, 20) projected
  line L3 (-316, 20) -> (-298, 20) projected
  line L4 (-59.7, -40) -> (-19.7, -40) projected
  line L5 (-25.25, 40) -> (-25.25, 34.8681) projected
  arc A2 (-26.4681, 33.65) -> (-25.25, 34.8681) centre (-25.75, 34.15) ccw projected
  line L6 (-26.4681, 33.65) -> (-49.5319, 33.65) projected
  arc A3 (-50.75, 34.8681) -> (-49.5319, 33.65) centre (-50.25, 34.15) ccw projected
  circle A4 centre (-306, 30) radius 2.6 projected
  circle A5 centre (-13, -52.3) radius 2.1 projected
  circle A6 centre (13, -52.3) radius 2.1 projected
  circle A7 centre (13, -26.3) radius 2.1 projected
  circle A8 centre (-13, -26.3) radius 2.1 projected
  circle A9 centre (-13, 26.3) radius 2.1 projected
  circle A10 centre (13, 26.3) radius 2.1 projected
  circle A11 centre (13, 52.3) radius 2.1 projected
  circle A12 centre (-13, 52.3) radius 2.1 projected
  line L7 (-19.7, -40) -> (-19.7, -59) projected
  line L8 (-19.7, -59) -> (19.7, -59) projected
  line L9 (19.7, -59) -> (19.7, 59) projected
  line L10 (19.7, 59) -> (-19.7, 59) projected
  line L11 (-19.7, 59) -> (-19.7, 40) projected
  line L12 (-19.7, 40) -> (-25.25, 40) projected
  line L13 (-298, 20) -> (-291.0718, 8) projected
  line L14 (-291.0718, 8) -> (-87.4128, 8) projected
  line L15 (-87.4128, 8) -> (-59.7, -40) projected
  point P0 (0, 0)
fillet "Fillet3" radius 1 8 edges at (-316, 40, 3.175) (-316, 20, 3.175) (-50.75, 40, 3.175) (-50.75, 34.8681, 3.175) (-49.5319, 33.65, 3.175) (-26.4681, 33.65, 3.175) (-25.25, 34.8681, 3.175) (-25.25, 40, 3.175)
fillet "Fillet4" radius 3 4 edges at (-59.7, -40, 3.175) (-291.0718, 8, 3.175) (-87.4128, 8, 3.175) (-298, 20, 3.175)
fillet "Fillet5" radius 2 6 edges at (-19.7, 40, 3.175) (-19.7, 59, 3.175) (19.7, 59, 3.175) (-19.7, -40, 3.175) (-19.7, -59, 3.175) (19.7, -59, 3.175)
sketch "Sketch10" plane through (0, 0, 6.35) normal (0, 0, 1) x (1, 0, 0)
  line L0 (-163.15, 17.9395) -> (-148.15, 26.5998)
  line L1 (-148.15, 26.5998) -> (-133.15, 17.9395)
  line L2 (-133.15, 17.9395) -> (-133.15, 0.619)
  line L3 (-133.15, 0.619) -> (-148.15, -8.0412)
  line L4 (-148.15, -8.0412) -> (-163.15, 0.619)
  line L5 (-163.15, 0.619) -> (-163.15, 17.9395)
  arc A0 (17.7, -59) -> (19.7, -57) centre (17.7, -57) ccw projected
  line L6 (19.7, -57) -> (19.7, 57) projected
  arc A1 (19.7, 57) -> (17.7, 59) centre (17.7, 57) ccw projected
  line L7 (17.7, 59) -> (-17.7, 59) projected
  arc A2 (-17.7, 59) -> (-19.7, 57) centre (-17.7, 57) ccw projected
  line L8 (-19.7, 57) -> (-19.7, 42) projected
  arc A3 (-21.7, 40) -> (-19.7, 42) centre (-21.7, 42) ccw projected
  line L9 (-21.7, 40) -> (-24.25, 40) projected
  arc A4 (-24.25, 40) -> (-25.25, 39) centre (-24.25, 39) ccw projected
  line L10 (-25.25, 39) -> (-25.25, 35.275) projected
  arc A5 (-25.25, 35.275) -> (-25.05, 34.675) centre (-24.25, 35.275) ccw projected
  arc A6 (-26.275, 33.45) -> (-25.05, 34.675) centre (-25.75, 34.15) ccw projected
  arc A7 (-26.275, 33.45) -> (-26.875, 33.65) centre (-26.875, 32.65) ccw projected
  line L11 (-26.875, 33.65) -> (-49.125, 33.65) projected
  arc A8 (-49.125, 33.65) -> (-49.725, 33.45) centre (-49.125, 32.65) ccw projected
  arc A9 (-50.95, 34.675) -> (-49.725, 33.45) centre (-50.25, 34.15) ccw projected
  arc A10 (-50.95, 34.675) -> (-50.75, 35.275) centre (-51.75, 35.275) ccw projected
  line L12 (-50.75, 35.275) -> (-50.75, 39) projected
  arc A11 (-50.75, 39) -> (-51.75, 40) centre (-51.75, 39) ccw projected
  line L13 (-51.75, 40) -> (-315, 40) projected
  arc A12 (-315, 40) -> (-316, 39) centre (-315, 39) ccw projected
  line L14 (-316, 39) -> (-316, 21) projected
  arc A13 (-316, 21) -> (-315, 20) centre (-315, 21) ccw projected
  line L15 (-315, 20) -> (-301.6658, 20) projected
  arc A14 (-300.3574, 19.8258) -> (-301.6658, 20) centre (-301.6658, 15) ccw projected
  line L16 (-300.3574, 19.8258) -> (-80.3426, -39.8258) projected
  arc A15 (-80.3426, -39.8258) -> (-79.0342, -40) centre (-79.0342, -35) ccw projected
  line L17 (-79.0342, -40) -> (-21.7, -40) projected
  arc A16 (-19.7, -42) -> (-21.7, -40) centre (-21.7, -42) ccw projected
  line L18 (-19.7, -42) -> (-19.7, -57) projected
  arc A17 (-19.7, -57) -> (-17.7, -59) centre (-17.7, -57) ccw projected
  line L19 (-17.7, -59) -> (17.7, -59) projected
  circle A18 centre (-28, 23.65) radius 2.65 projected
  circle A19 centre (-48, 23.65) radius 2.65 projected
  circle A20 centre (-306, 30) radius 2.6 projected
  circle A21 centre (-13, -52.3) radius 2.1 projected
  circle A22 centre (13, -52.3) radius 2.1 projected
  circle A23 centre (13, -26.3) radius 2.1 projected
  circle A24 centre (-13, -26.3) radius 2.1 projected
  circle A25 centre (-13, 26.3) radius 2.1 projected
  circle A26 centre (13, 26.3) radius 2.1 projected
  circle A27 centre (13, 52.3) radius 2.1 projected
  circle A28 centre (-13, 52.3) radius 2.1 projected
  line L20 (-163.15, 17.9395) -> (-148.15, 9.2793)
  line L21 (-148.15, 9.2793) -> (-133.15, 17.9395)
  line L22 (-148.15, 9.2793) -> (-148.15, -8.0412) construction
  line L23 (-148.15, 0.619) -> (-163.15, 9.2793)
  line L24 (-148.15, 0.619) -> (-133.15, 9.2793)
  line L25 (-133.15, 15.0528) -> (-148.15, 6.3925)
  line L26 (-148.15, 6.3925) -> (-163.15, 15.0528)
  line L27 (-163.15, 6.3925) -> (-148.15, -2.2677)
  line L28 (-148.15, -2.2677) -> (-133.15, 6.3925)
  line L29 (-51.75, 40) -> (-315, 40) construction
  line L30 (-148.15, 40) -> (-148.15, -21.4415) construction
  line L31 (-316, 30) -> (19.7, 30) construction
  point P0 (0, 0)
  point P1 (-148.15, 30)
  dimension "d132" = 30
  dimension "d133" = 5
  dimension "d134" = 2.5
  dimension "d135" = 5
equation "\"d54\" = d53"
properties part number "Z-Axis Bed Plates"
